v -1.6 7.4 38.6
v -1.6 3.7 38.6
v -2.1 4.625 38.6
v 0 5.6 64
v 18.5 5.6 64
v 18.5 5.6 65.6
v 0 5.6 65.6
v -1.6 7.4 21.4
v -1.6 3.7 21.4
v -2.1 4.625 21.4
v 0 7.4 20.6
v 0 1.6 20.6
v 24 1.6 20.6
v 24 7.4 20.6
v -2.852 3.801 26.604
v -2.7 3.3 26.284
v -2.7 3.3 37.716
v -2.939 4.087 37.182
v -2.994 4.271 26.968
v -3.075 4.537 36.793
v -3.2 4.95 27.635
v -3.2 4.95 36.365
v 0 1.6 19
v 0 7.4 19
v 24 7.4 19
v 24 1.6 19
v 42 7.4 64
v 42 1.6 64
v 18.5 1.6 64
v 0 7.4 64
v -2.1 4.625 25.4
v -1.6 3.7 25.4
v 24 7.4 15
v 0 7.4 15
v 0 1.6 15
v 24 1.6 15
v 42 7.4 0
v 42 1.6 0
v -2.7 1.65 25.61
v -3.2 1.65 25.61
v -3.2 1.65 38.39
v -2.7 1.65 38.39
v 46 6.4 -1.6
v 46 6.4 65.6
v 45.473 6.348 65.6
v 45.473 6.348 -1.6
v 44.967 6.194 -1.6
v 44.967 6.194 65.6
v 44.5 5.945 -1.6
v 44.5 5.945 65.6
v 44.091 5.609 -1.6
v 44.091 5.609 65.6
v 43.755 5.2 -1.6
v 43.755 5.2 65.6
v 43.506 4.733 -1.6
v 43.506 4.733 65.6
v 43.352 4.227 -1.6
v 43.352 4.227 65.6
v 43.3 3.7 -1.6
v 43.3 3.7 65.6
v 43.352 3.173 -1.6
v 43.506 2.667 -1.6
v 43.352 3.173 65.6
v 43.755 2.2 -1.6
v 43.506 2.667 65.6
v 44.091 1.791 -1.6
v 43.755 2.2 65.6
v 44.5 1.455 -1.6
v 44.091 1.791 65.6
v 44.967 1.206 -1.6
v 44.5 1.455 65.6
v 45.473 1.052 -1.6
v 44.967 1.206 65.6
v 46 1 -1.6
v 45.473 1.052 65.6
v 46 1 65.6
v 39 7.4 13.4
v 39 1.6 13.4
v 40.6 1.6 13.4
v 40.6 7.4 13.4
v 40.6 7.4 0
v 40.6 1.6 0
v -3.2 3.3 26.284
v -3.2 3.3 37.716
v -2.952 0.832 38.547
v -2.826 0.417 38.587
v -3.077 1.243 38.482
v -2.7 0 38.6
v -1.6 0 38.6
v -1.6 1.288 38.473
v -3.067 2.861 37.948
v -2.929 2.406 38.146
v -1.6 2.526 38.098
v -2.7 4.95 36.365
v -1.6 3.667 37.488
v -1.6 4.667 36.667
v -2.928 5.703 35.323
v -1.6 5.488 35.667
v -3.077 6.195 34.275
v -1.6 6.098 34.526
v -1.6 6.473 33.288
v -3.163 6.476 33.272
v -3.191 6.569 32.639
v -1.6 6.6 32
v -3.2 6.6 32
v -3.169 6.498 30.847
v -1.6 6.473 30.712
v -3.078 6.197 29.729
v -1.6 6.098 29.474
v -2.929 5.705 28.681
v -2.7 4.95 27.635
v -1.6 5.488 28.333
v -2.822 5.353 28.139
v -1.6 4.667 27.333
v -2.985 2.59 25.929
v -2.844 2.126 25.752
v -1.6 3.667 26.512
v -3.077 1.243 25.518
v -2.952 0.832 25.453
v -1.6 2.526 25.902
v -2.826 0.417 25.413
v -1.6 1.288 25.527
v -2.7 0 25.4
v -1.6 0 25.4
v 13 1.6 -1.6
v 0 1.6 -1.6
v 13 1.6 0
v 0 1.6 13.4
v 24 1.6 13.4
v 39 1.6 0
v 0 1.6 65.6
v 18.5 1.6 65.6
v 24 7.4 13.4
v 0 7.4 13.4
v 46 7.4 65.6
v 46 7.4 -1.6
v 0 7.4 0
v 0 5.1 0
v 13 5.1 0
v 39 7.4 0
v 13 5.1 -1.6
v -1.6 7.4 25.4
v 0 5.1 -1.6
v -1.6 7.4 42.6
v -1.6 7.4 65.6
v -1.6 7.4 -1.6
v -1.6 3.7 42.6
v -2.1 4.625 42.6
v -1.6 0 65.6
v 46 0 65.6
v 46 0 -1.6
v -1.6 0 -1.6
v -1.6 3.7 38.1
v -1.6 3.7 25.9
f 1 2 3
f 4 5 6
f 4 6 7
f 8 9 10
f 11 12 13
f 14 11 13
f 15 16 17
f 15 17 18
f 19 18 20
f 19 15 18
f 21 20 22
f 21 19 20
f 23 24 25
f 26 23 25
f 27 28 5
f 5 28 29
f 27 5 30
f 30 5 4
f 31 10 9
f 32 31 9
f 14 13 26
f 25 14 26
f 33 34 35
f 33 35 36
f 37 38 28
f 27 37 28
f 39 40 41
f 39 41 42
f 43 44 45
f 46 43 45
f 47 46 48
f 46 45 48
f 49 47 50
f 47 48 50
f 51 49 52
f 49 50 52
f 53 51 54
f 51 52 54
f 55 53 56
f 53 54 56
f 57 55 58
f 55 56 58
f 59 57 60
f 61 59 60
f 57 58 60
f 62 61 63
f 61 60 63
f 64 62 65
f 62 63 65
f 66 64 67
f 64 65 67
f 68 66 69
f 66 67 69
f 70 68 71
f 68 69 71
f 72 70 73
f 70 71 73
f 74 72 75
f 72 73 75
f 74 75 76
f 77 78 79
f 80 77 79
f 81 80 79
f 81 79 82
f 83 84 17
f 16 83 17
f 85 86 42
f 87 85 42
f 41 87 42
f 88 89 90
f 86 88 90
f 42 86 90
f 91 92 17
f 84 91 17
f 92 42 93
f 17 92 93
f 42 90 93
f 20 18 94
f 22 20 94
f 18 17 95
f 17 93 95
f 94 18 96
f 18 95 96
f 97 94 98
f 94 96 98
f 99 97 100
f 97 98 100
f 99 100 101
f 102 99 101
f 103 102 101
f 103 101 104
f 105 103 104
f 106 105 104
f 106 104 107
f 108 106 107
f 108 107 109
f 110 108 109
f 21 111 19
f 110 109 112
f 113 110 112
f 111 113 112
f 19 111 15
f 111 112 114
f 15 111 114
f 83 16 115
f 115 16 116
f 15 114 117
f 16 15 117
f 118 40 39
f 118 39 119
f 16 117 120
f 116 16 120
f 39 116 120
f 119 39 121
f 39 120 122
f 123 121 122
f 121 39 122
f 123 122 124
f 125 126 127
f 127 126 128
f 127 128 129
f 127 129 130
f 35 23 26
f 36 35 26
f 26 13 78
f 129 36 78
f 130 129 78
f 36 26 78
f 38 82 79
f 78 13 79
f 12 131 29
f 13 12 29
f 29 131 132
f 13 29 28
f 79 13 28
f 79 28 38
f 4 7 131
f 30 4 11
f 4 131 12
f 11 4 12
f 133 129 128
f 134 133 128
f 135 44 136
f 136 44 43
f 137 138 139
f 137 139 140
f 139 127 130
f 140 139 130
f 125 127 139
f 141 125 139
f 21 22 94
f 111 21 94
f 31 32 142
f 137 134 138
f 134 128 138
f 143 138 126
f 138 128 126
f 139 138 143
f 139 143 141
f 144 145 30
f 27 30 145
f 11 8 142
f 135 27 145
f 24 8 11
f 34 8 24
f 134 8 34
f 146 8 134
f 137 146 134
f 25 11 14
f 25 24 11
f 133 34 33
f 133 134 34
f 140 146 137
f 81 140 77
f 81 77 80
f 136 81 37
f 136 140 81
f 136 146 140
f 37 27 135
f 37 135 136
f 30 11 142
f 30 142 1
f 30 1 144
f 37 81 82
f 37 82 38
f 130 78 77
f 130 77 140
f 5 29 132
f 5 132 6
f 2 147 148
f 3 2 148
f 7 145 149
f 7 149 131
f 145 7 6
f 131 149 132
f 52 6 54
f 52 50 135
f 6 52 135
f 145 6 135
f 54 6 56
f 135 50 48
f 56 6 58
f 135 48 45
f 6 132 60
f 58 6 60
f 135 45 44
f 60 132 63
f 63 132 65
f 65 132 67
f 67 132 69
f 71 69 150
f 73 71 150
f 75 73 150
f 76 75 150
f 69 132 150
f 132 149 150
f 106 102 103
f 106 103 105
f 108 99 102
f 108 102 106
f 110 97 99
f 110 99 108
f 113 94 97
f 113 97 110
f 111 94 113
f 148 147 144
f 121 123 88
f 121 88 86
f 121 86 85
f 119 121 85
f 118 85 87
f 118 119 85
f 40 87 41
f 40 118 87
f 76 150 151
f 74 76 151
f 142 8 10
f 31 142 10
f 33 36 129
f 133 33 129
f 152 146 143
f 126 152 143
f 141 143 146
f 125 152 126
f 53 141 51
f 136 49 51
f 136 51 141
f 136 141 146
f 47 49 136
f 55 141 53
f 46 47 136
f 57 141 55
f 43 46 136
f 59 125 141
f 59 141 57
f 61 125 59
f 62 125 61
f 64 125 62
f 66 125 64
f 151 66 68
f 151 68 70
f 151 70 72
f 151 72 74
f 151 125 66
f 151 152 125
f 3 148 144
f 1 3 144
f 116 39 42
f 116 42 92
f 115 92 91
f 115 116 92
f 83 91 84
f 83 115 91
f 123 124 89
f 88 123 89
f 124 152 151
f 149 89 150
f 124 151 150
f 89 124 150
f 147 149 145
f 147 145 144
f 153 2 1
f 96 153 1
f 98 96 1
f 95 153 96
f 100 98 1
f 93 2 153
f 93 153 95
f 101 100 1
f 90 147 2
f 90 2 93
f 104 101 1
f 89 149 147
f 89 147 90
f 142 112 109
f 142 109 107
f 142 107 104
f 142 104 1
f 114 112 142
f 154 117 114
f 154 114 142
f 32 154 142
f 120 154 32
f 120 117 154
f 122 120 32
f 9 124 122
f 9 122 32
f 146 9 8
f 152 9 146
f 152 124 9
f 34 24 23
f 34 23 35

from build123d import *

# Parameters (mm, degrees)
SKETCH2_W            = 42
SKETCH2_H            = 64
BOSS_EXTRUDE1_DEPTH  = 1.6
SKETCH4_W            = 47.6
SKETCH4_H            = 67.2
SKETCH4_W_2          = 42
SKETCH4_H_2          = 64
BOSS_EXTRUDE2_DEPTH  = 6.6
BOSS_EXTRUDE3_DEPTH  = 1.6
CUT_EXTRUDE2_DEPTH   = 53.6
SKETCH12_W           = 18.5
SKETCH12_H           = 4
CUT_EXTRUDE5_DEPTH   = 4.5
SKETCH14_W           = 24
SKETCH14_H           = 7.2
BOSS_EXTRUDE6_DEPTH  = 5
SKETCH21_W           = 47.6
SKETCH21_H           = 67.2
BOSS_EXTRUDE8_DEPTH  = 0.8
SKETCH22_W           = 13
SKETCH22_H           = 3.5
CUT_EXTRUDE6_DEPTH   = 10.8
SKETCH26_W           = 24
SKETCH26_H           = 4
CUT_EXTRUDE7_DEPTH   = 5.8
SKETCH27_W           = 3
SKETCH27_H           = 13.4
BOSS_EXTRUDE9_DEPTH  = 5.8
SKETCH28_R           = 2.7
CUT_EXTRUDE8_DEPTH   = 70.8
SKETCH29_W           = 4
SKETCH29_H           = 3.7
BOSS_EXTRUDE10_DEPTH = 0.5
CUT_EXTRUDE9_DEPTH   = 4.5
CUT_EXTRUDE10_DEPTH  = 4.5
SKETCH38_W           = 1.4
SKETCH38_H           = 13.4
CUT_EXTRUDE12_DEPTH  = 5.8


with BuildPart() as part:
    # Sketch2 → Boss-Extrude1 (new body)
    with BuildSketch(Plane(origin=(0, 0, 0), x_dir=(1, 0, 0), z_dir=(0, 1, 0))):
        with Locations((21, -32)):
            Rectangle(SKETCH2_W, SKETCH2_H)
    extrude(amount=BOSS_EXTRUDE1_DEPTH)

    # Sketch4 → Boss-Extrude2 (add)
    with BuildSketch(Plane(origin=(0, 0, 0), x_dir=(1, 0, 0), z_dir=(0, 1, 0))):
        with Locations((22.2, -32)):
            Rectangle(SKETCH4_W, SKETCH4_H)
        with Locations((21, -32)):
            Rectangle(SKETCH4_W_2, SKETCH4_H_2, mode=Mode.SUBTRACT)
    extrude(amount=BOSS_EXTRUDE2_DEPTH)

    # Sketch6 → Boss-Extrude3 (add)
    with BuildSketch(Plane.ZY.offset(1.6)):
        with BuildLine():
            Line((25.4, 0), (38.6, 0))
            ThreePointArc((38.6, 0), (32, 6.6), (25.4, 0))
        make_face()
    extrude(amount=BOSS_EXTRUDE3_DEPTH)

    # Sketch7 → Cut-Extrude2 (cut)
    with BuildSketch(Plane.XY):
        Polygon((-3.2, 6.6), (-3.2, 4.95), (-2.7, 4.95), align=None)
        Polygon((-3.2, 4.95), (-3.2, 3.3), (-2.7, 3.3), align=None)
        Polygon((-2.7, 1.65), (-3.2, 3.3), (-3.2, 1.65), align=None)
        Polygon((-2.7, 0), (-3.2, 1.65), (-3.2, 0), align=None)
    extrude(amount=CUT_EXTRUDE2_DEPTH, mode=Mode.SUBTRACT)

    # Sketch12 → Cut-Extrude5 (cut)
    with BuildSketch(Plane(origin=(0, 0, 64), x_dir=(-1, 0, 0), z_dir=(0, 0, -1))):
        with Locations((-9.25, 3.6)):
            Rectangle(SKETCH12_W, SKETCH12_H)
    extrude(amount=-CUT_EXTRUDE5_DEPTH, mode=Mode.SUBTRACT)

    # Sketch14 → Boss-Extrude6 (add)
    with BuildSketch(Plane(origin=(0, 1.6, 0), x_dir=(1, 0, 0), z_dir=(0, 1, 0))):
        with Locations((12, -17)):
            Rectangle(SKETCH14_W, SKETCH14_H)
    extrude(amount=BOSS_EXTRUDE6_DEPTH)

    # Sketch21 → Boss-Extrude8 (add)
    with BuildSketch(Plane(origin=(0, 6.6, 0), x_dir=(1, 0, 0), z_dir=(0, 1, 0))):
        with Locations((22.2, -32)):
            Rectangle(SKETCH21_W, SKETCH21_H)
        Polygon((0, -13.4), (0, 0), (42, 0), (42, -64), (0, -64), (0, -20.6), (24, -20.6), (24, -13.4), align=None, mode=Mode.SUBTRACT)
    extrude(amount=BOSS_EXTRUDE8_DEPTH)

    # Sketch22 → Cut-Extrude6 (cut)
    with BuildSketch(Plane.XY):
        with Locations((6.5, 3.35)):
            Rectangle(SKETCH22_W, SKETCH22_H)
    extrude(amount=-CUT_EXTRUDE6_DEPTH, mode=Mode.SUBTRACT)

    # Sketch26 → Cut-Extrude7 (cut)
    with BuildSketch(Plane(origin=(0, 7.4, 0), x_dir=(1, 0, 0), z_dir=(0, 1, 0))):
        with Locations((12, -17)):
            Rectangle(SKETCH26_W, SKETCH26_H)
    extrude(amount=-CUT_EXTRUDE7_DEPTH, mode=Mode.SUBTRACT)

    # Sketch27 → Boss-Extrude9 (add)
    with BuildSketch(Plane(origin=(0, 1.6, 0), x_dir=(1, 0, 0), z_dir=(0, 1, 0))):
        with Locations((40.5, -6.7)):
            Rectangle(SKETCH27_W, SKETCH27_H)
    extrude(amount=BOSS_EXTRUDE9_DEPTH)

    # Sketch28 → Cut-Extrude8 (cut)
    with BuildSketch(Plane.XY.offset(65.6)):
        with Locations((46, 3.7)):
            Circle(SKETCH28_R)
    extrude(amount=-CUT_EXTRUDE8_DEPTH, mode=Mode.SUBTRACT)

    # Sketch29 → Boss-Extrude10 (add)
    with BuildSketch(Plane.ZY.offset(1.6)):
        with Locations((23.4, 5.55)):
            Rectangle(SKETCH29_W, SKETCH29_H)
        with Locations((40.6, 5.55)):
            Rectangle(SKETCH29_W, SKETCH29_H)
    extrude(amount=BOSS_EXTRUDE10_DEPTH)

    # Sketch30 → Cut-Extrude9 (cut)
    with BuildSketch(Plane(origin=(0, 0, 21.4), x_dir=(-1, 0, 0), z_dir=(0, 0, -1))):
        Polygon((2.1, 4.625), (2.1, 5.55), (2.1, 7.4), (1.6, 7.4), align=None)
        Polygon((2.1, 3.7), (2.1, 4.625), (1.6, 3.7), align=None)
    extrude(amount=-CUT_EXTRUDE9_DEPTH, mode=Mode.SUBTRACT)

    # Sketch31 → Cut-Extrude10 (cut)
    with BuildSketch(Plane.XY.offset(42.6)):
        Polygon((-2.1, 5.55), (-2.1, 4.625), (-1.6, 7.4), (-2.1, 7.4), align=None)
        Polygon((-2.1, 4.625), (-2.1, 3.7), (-1.6, 3.7), align=None)
    extrude(amount=-CUT_EXTRUDE10_DEPTH, mode=Mode.SUBTRACT)

    # Sketch38 → Cut-Extrude12 (cut)
    with BuildSketch(Plane(origin=(0, 7.4, 0), x_dir=(1, 0, 0), z_dir=(0, 1, 0))):
        with Locations((41.3, -6.7)):
            Rectangle(SKETCH38_W, SKETCH38_H)
    extrude(amount=-CUT_EXTRUDE12_DEPTH, mode=Mode.SUBTRACT)


solid = part.part
